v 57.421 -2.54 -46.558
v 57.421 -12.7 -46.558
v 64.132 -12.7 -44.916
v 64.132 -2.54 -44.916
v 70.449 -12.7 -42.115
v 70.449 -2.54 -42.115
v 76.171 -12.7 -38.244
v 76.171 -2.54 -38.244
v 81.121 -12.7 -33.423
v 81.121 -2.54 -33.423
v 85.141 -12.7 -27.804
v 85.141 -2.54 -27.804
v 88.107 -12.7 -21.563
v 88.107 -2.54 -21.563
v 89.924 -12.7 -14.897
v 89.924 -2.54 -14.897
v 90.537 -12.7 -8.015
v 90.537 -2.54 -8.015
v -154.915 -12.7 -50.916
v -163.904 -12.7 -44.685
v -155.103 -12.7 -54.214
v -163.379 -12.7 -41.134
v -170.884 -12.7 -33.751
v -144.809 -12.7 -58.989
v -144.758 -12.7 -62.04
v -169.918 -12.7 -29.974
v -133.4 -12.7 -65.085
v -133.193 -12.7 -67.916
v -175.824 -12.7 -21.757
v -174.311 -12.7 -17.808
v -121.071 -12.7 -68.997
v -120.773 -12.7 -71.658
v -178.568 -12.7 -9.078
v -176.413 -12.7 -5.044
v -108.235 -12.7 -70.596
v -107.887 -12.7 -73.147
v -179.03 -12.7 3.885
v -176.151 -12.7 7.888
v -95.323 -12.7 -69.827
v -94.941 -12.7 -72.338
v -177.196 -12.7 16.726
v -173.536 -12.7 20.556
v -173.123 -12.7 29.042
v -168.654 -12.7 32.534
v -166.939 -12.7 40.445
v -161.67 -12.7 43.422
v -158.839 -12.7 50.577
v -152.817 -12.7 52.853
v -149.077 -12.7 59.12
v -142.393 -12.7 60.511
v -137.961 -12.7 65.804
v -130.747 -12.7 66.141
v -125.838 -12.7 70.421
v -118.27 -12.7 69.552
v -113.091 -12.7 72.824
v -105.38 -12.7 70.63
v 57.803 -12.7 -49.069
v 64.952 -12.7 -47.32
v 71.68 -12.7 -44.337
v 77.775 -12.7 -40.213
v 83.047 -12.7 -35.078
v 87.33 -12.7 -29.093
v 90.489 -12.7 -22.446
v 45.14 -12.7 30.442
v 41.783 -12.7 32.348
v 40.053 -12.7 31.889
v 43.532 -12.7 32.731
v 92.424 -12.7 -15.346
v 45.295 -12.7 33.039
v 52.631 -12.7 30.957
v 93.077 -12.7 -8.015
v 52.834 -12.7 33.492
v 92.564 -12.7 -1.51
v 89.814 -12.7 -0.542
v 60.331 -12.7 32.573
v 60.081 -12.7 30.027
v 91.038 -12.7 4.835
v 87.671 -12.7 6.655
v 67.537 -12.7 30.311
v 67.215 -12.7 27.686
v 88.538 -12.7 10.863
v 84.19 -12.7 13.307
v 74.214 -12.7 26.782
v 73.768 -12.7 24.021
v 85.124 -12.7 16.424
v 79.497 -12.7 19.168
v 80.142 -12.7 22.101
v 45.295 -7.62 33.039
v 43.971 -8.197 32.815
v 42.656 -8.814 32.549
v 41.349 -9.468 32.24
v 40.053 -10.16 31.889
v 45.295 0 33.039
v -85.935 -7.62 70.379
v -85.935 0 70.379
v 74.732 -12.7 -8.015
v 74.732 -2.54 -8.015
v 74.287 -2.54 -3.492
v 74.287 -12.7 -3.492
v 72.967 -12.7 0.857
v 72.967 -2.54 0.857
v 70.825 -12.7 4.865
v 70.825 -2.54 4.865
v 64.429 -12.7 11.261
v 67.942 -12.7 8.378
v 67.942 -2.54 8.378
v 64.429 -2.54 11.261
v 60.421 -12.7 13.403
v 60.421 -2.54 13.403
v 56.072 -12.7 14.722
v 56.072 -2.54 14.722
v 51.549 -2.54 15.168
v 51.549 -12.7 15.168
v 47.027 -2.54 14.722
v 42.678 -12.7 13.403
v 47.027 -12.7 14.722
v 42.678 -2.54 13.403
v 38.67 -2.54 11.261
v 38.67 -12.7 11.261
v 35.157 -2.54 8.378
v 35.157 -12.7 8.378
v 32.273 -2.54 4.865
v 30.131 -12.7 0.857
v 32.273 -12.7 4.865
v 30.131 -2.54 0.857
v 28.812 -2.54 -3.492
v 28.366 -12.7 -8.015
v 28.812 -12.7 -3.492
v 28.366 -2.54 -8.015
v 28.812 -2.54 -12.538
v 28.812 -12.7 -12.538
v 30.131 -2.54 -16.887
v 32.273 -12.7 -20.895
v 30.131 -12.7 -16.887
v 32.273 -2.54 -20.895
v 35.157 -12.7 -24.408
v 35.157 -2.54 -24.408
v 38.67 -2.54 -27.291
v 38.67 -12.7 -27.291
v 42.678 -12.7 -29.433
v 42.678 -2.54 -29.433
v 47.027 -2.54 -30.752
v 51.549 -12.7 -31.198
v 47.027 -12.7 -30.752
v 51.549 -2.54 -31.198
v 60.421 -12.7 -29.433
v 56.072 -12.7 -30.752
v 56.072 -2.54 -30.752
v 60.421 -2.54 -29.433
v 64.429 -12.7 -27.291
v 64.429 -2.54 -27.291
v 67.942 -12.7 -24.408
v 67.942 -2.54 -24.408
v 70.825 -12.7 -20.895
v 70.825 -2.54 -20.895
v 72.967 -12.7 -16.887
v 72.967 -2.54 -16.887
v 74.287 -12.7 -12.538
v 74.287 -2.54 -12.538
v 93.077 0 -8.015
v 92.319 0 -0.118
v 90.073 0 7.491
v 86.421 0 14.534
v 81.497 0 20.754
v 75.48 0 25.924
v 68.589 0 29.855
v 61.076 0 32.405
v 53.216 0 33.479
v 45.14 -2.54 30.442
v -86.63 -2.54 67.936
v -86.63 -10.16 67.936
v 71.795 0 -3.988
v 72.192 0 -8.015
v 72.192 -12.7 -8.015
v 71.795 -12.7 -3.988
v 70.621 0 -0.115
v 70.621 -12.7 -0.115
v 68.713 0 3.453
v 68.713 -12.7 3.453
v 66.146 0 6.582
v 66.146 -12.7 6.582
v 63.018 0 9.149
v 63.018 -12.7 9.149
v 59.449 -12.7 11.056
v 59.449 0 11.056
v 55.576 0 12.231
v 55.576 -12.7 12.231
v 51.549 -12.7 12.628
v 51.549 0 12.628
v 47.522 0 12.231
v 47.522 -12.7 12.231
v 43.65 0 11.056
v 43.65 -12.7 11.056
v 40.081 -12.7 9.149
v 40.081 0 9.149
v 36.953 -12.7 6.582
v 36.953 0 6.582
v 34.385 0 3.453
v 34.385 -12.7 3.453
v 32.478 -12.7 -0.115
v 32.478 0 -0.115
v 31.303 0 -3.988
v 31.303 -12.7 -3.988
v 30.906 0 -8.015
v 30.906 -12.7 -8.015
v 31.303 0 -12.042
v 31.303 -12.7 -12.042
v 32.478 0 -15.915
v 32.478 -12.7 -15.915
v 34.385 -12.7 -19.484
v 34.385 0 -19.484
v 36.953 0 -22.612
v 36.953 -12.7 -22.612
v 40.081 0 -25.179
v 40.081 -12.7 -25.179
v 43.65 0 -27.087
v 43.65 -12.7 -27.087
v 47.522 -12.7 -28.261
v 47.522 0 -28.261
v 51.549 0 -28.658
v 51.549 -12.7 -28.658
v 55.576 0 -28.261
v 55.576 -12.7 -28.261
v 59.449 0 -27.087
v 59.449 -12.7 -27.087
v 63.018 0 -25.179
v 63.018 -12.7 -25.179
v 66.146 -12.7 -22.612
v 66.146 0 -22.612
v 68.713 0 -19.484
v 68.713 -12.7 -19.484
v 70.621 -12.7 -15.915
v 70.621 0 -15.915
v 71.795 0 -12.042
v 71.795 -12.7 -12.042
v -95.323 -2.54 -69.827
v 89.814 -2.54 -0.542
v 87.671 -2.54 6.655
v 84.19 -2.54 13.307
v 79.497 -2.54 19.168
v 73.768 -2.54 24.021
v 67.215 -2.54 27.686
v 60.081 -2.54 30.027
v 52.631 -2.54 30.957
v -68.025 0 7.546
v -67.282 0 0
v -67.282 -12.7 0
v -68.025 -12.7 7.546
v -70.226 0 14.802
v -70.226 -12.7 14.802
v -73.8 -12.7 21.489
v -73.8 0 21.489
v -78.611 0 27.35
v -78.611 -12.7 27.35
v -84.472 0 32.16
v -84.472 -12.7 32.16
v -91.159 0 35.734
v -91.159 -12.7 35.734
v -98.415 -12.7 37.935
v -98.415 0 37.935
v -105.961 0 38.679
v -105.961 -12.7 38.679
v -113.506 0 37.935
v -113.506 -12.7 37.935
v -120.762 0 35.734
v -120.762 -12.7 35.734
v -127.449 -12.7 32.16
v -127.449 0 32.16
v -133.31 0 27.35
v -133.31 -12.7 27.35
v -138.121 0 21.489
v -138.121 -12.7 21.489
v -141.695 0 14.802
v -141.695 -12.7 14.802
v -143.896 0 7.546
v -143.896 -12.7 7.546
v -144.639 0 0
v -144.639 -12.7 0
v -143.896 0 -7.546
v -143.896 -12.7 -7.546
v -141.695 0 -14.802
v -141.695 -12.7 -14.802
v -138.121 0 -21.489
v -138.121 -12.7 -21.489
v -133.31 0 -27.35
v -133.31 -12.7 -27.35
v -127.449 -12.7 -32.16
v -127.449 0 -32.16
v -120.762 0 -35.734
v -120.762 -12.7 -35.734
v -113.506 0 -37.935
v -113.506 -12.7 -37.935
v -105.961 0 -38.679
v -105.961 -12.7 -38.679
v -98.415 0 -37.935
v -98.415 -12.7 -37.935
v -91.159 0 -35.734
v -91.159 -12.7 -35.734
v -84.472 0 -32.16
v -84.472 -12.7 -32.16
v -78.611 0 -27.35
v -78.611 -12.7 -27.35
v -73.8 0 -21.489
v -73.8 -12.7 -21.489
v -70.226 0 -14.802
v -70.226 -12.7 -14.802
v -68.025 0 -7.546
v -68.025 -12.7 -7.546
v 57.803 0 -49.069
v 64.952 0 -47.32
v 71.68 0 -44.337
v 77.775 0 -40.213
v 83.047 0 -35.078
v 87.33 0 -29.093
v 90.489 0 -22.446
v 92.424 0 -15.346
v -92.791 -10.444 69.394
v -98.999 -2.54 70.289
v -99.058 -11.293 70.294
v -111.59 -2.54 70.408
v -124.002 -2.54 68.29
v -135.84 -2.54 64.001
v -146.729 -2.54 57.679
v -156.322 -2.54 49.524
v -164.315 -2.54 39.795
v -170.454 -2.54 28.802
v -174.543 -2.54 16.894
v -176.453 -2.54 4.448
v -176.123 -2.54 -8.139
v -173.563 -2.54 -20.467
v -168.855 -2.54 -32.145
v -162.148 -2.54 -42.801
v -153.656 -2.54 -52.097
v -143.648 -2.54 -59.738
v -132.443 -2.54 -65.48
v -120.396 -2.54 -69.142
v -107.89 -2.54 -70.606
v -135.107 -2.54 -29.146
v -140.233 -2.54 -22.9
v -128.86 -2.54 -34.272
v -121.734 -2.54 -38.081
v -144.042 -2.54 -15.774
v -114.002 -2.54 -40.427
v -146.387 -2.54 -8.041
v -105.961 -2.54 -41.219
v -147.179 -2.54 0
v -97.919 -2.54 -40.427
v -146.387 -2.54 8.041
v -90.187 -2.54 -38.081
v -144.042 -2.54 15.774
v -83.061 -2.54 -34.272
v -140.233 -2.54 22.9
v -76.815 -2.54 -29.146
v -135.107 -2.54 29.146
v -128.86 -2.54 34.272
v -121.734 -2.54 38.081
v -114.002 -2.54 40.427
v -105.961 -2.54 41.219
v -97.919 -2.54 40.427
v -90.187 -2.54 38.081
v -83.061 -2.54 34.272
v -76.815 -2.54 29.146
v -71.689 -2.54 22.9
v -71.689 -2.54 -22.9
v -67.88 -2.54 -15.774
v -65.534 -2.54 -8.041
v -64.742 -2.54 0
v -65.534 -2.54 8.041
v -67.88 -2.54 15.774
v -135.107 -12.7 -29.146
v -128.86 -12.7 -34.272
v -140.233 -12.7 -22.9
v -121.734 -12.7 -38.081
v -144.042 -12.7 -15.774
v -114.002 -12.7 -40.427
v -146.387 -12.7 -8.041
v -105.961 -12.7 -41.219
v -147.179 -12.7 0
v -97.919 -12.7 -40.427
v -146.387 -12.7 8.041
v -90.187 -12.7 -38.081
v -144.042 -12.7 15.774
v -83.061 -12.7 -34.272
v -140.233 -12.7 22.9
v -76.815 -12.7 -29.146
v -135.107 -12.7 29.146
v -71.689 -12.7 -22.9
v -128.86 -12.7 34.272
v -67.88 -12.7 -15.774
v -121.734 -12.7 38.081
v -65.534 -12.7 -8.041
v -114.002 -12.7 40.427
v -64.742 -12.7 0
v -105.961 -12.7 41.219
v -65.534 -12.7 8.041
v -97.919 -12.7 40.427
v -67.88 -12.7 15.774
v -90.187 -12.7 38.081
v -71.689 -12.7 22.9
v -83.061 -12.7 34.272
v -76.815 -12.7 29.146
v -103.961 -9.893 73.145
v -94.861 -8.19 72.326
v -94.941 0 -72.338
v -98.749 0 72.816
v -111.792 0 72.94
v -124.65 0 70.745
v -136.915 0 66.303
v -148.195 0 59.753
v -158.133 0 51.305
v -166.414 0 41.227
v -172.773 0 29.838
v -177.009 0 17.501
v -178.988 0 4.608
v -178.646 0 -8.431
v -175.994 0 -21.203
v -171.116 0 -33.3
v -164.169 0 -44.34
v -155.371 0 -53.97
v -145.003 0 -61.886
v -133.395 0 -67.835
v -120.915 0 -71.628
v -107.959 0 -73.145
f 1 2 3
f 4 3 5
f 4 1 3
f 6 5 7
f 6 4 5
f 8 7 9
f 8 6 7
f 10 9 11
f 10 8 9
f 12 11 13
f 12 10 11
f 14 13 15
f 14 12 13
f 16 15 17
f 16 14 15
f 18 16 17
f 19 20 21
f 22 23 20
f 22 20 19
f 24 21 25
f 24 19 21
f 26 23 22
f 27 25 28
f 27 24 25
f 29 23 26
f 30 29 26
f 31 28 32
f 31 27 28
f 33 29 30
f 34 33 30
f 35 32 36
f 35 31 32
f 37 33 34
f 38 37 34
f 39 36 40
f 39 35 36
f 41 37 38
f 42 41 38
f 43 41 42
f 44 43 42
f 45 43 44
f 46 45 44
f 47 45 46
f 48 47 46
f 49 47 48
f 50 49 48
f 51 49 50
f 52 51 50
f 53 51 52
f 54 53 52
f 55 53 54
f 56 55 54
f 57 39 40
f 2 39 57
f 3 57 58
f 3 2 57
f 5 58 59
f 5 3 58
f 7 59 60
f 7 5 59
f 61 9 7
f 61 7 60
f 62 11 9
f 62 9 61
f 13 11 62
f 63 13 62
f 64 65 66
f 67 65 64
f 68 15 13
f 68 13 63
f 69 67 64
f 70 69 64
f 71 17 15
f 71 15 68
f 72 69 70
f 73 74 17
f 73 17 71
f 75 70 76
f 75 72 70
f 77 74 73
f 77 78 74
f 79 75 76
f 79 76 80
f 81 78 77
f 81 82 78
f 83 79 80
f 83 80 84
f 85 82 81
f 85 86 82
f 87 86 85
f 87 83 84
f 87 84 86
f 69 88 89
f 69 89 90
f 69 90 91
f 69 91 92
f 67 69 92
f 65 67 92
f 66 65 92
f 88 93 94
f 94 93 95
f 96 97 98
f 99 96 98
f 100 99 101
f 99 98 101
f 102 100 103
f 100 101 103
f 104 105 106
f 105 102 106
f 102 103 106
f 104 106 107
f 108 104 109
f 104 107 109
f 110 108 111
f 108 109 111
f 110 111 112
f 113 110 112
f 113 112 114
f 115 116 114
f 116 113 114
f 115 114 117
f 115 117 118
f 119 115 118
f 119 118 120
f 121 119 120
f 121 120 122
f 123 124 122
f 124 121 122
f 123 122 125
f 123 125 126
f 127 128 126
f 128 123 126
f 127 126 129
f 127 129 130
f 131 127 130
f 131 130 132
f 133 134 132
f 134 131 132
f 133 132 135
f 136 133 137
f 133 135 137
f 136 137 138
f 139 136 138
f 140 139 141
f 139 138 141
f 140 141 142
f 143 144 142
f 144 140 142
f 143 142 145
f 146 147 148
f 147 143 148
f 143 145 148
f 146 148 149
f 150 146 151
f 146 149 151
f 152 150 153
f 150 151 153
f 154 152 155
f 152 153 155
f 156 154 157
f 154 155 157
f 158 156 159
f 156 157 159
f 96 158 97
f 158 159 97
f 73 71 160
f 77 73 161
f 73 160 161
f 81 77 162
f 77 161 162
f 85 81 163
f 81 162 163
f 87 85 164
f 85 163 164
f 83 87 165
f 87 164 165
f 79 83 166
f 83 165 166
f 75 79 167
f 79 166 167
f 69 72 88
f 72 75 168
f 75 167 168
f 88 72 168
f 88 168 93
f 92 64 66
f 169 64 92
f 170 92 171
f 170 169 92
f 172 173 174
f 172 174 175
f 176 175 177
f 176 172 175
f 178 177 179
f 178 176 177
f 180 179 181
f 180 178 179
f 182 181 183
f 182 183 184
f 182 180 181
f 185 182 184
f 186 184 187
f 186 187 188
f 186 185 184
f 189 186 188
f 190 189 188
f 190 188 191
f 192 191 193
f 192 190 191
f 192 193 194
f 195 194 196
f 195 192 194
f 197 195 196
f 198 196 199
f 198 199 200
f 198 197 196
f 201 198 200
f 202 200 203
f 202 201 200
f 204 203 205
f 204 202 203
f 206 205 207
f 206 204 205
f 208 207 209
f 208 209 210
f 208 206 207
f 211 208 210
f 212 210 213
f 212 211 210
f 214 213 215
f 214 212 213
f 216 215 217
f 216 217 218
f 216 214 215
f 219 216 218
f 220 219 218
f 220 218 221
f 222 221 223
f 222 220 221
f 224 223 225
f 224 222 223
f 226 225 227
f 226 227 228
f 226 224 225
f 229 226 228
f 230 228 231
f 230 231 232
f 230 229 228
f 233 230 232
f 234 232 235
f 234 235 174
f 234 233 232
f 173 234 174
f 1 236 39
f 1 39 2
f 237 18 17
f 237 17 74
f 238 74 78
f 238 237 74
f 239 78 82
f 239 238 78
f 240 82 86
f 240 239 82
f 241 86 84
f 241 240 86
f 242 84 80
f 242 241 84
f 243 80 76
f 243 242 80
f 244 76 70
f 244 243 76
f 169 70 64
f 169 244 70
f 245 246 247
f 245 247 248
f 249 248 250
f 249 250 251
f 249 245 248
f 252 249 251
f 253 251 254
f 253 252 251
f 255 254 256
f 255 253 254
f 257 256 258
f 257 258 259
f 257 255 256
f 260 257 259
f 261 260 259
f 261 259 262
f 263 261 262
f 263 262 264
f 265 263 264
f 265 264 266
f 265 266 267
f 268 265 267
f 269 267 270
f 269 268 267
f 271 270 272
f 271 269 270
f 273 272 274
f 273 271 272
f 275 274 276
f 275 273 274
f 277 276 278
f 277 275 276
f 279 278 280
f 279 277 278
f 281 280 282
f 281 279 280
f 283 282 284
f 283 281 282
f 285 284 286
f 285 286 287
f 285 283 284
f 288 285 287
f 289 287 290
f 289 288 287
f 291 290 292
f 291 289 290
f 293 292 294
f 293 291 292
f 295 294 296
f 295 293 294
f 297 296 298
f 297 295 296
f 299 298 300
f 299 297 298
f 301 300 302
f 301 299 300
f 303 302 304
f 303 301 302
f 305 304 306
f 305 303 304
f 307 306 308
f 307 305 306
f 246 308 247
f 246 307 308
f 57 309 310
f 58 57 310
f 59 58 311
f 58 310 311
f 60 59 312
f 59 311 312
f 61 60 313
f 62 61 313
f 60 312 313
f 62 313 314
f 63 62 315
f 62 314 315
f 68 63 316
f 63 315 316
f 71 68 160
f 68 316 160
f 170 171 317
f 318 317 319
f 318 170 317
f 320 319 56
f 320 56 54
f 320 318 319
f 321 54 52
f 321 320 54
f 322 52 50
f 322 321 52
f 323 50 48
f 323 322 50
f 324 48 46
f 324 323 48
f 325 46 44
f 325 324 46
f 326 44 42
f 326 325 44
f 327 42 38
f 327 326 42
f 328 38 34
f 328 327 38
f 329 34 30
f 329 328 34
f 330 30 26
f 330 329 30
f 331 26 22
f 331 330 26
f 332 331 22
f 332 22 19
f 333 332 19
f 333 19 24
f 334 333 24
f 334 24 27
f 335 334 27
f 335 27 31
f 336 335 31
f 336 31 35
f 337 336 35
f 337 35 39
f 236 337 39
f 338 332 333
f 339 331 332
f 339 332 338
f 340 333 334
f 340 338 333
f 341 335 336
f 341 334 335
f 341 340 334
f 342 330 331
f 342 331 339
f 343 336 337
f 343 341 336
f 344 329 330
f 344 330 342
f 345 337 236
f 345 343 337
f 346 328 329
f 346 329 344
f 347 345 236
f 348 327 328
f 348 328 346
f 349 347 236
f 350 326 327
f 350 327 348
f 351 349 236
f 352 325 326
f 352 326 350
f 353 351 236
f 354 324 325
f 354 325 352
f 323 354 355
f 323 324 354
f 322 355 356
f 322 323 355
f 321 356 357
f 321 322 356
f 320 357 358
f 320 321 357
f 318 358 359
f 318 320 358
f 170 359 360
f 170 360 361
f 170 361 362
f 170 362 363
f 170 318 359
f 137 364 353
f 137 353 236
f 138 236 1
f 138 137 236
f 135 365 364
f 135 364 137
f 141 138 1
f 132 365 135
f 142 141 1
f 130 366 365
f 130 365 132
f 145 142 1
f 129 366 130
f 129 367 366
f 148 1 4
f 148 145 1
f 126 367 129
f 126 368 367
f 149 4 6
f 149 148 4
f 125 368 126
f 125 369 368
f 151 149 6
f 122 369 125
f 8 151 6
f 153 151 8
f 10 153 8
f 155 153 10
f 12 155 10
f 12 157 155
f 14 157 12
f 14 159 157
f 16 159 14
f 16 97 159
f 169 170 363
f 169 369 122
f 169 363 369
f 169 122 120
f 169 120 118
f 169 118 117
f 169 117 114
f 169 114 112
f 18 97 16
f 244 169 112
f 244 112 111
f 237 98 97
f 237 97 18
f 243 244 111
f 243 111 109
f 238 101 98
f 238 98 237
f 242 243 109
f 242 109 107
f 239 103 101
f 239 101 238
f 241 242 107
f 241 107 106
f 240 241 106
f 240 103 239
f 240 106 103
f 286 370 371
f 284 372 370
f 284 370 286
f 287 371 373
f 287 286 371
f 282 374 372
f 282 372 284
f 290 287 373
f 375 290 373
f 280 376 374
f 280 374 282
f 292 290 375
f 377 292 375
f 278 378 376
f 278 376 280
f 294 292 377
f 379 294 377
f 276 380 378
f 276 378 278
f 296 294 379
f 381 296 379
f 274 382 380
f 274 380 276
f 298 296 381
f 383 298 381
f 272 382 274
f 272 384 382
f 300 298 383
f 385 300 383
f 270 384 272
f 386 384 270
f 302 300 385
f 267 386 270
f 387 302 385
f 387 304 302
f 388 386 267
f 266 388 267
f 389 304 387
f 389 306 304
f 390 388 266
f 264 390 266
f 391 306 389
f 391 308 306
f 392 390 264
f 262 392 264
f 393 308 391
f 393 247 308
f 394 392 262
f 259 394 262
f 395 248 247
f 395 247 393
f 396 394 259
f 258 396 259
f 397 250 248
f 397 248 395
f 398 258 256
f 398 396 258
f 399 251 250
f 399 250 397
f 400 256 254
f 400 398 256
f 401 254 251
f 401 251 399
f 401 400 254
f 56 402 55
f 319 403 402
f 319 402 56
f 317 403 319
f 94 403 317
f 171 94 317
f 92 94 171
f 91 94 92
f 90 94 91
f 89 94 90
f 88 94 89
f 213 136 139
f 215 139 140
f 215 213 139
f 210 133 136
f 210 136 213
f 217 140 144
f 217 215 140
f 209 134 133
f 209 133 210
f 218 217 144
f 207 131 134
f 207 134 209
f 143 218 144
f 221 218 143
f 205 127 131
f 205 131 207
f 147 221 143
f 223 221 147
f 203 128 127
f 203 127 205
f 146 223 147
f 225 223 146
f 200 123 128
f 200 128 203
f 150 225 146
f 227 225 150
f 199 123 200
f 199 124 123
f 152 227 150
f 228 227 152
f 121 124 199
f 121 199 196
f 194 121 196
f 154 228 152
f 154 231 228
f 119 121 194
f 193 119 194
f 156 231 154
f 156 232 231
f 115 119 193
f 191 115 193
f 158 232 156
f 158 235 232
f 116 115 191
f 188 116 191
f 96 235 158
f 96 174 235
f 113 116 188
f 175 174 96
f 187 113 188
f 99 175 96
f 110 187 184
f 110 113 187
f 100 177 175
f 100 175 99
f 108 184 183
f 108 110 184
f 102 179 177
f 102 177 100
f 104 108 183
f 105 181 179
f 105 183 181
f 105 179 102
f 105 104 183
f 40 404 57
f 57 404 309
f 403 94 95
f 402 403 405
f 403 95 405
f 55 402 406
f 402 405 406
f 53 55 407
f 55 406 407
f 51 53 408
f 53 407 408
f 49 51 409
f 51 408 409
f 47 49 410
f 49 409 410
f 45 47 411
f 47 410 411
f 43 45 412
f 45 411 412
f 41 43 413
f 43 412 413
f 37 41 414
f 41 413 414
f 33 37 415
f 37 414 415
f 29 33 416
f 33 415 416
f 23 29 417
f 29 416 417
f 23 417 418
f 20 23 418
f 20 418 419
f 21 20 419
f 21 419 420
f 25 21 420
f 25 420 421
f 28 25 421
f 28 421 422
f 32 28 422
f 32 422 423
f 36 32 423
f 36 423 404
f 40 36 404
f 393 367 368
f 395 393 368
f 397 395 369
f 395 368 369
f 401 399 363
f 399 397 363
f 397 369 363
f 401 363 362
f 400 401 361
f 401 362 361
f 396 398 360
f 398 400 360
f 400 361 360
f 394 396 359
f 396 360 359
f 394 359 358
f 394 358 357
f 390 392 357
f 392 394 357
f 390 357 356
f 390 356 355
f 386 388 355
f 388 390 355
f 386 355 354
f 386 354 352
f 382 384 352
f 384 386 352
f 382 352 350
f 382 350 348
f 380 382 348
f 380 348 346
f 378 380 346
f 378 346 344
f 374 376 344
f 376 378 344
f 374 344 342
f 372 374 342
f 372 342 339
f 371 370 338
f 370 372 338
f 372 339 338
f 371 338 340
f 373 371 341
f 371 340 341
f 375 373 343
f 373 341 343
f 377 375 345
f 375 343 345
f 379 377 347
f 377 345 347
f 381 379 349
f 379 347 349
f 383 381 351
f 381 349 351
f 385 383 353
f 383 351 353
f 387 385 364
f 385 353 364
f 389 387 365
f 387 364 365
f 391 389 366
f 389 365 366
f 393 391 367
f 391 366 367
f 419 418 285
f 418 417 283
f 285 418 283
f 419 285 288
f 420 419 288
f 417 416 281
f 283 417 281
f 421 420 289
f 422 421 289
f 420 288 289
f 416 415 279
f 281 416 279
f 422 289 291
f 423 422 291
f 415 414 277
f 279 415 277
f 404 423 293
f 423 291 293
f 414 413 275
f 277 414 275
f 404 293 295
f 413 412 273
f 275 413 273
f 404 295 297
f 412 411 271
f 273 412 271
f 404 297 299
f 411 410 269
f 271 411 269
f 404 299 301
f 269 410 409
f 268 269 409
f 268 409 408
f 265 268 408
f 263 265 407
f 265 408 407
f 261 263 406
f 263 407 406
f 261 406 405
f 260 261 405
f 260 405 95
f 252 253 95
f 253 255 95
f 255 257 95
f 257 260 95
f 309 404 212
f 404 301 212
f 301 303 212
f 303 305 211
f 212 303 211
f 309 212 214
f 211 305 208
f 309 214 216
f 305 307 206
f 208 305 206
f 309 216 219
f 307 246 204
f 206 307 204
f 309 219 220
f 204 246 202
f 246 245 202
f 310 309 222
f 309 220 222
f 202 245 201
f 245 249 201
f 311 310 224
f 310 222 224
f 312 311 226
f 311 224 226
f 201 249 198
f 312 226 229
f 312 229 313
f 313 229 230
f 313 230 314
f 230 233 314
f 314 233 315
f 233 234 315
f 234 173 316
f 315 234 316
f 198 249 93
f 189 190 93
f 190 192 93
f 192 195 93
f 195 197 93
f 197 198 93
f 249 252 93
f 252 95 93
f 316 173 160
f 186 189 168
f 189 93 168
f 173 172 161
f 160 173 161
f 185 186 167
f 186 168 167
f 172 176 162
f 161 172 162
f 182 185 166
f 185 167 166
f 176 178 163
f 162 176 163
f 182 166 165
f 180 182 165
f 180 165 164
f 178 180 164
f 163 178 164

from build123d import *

# Parameters (mm, degrees)
F0_R        = 38.6786134899
F0_R_2      = 20.6427828865
F1_DEPTH    = 12.7
F2_T        = -2.54
F3_T4_DEPTH = 240.9522929605
F3_S5_R     = 41.5273672124
F3_T6_DEPTH = 123


# Not quite as in the source:
# - a fillet or chamfer that OpenCascade refuses, or shapes differently, is made with other operations: its cross-section is extruded or revolved along the edge and cut away or added


with BuildPart() as f1:
    # F0 (on Front) → F1 (new body)
    with BuildSketch(Plane.XZ):
        with BuildLine():
            ThreePointArc((-94.9406012258, -72.3378666508), (-50.4602870277, -47.6856781771), (-32.7881381913, 0))
            ThreePointArc((-32.7881381913, 0), (-47.5673995621, 44.0958373502), (-85.9349974728, 70.3788521857))
            ThreePointArc((-85.9349974728, 70.3788521857), (-178.9877879079, 4.6081079803), (-94.9406012258, -72.3378666508))
        make_face()
        with Locations((-105.9605851769, 0)):
            Circle(F0_R, mode=Mode.SUBTRACT)
        with BuildLine():
            ThreePointArc((-85.9349974728, 70.3788521857), (-47.5673995621, 44.0958373502), (-32.7881381913, 0))
            ThreePointArc((-32.7881381913, 0), (-50.4602870277, -47.6856781771), (-94.9406012258, -72.3378666508))
            Line((-94.9406012258, -72.3378666508), (57.8033803815, -49.0687780824))
            ThreePointArc((57.8033803815, -49.0687780824), (10.4955177286, -14.2692006943), (45.2950951166, 33.0386619586))
            Line((45.2950951166, 33.0386619586), (-85.9349974728, 70.3788521857))
        make_face()
        with BuildLine():
            ThreePointArc((93.0766049614, -8.0150580619), (78.6121658048, 23.4828808015), (45.2950951166, 33.0386619586))
            ThreePointArc((45.2950951166, 33.0386619586), (10.4955177286, -14.2692006943), (57.8033803815, -49.0687780824))
            ThreePointArc((57.8033803815, -49.0687780824), (83.0471766125, -35.0779861176), (93.0766049614, -8.0150580619))
        make_face()
        with Locations((51.5492377491, -8.0150580619)):
            Circle(F0_R_2, mode=Mode.SUBTRACT)
    extrude(amount=F1_DEPTH)

    # F2
    f2_openings = [f1.faces().sort_by_distance(p)[0] for p in [
        (-50.29361, -12.7, -3.378795),
    ]]
    offset(amount=F2_T, openings=f2_openings, kind=Kind.INTERSECTION)

    # F3: chamfer of 5.08 on 1 edges, made by hand


with BuildPart() as f3_tool2:
    # F3_s3 → F3_t4 (new body)
    with BuildSketch(Plane(origin=(96.0327547633, 0, -27.3251451716), x_dir=(0, 1, 0), z_dir=(-0.961821766, 0, 0.2736766164))):
        Polygon((-7.62, -44.1735125635), (-12.7, -39.0935125635), (-12.7, -44.1735125635), align=None)
    extrude(amount=F3_T4_DEPTH)

    # F3_s5 → F3_t6 (cut, symmetric)
    with BuildSketch(Plane.XZ.offset(10.2)):
        with Locations((51.5492377491, -8.0150580619)):
            Circle(F3_S5_R)
    extrude(amount=F3_T6_DEPTH, both=True, mode=Mode.SUBTRACT)


with BuildPart() as f1_1:
    add(f1.part)

    # F3_t1: cut F3_tool2
    add(f3_tool2.part, mode=Mode.SUBTRACT)


solid = f1_1.part
